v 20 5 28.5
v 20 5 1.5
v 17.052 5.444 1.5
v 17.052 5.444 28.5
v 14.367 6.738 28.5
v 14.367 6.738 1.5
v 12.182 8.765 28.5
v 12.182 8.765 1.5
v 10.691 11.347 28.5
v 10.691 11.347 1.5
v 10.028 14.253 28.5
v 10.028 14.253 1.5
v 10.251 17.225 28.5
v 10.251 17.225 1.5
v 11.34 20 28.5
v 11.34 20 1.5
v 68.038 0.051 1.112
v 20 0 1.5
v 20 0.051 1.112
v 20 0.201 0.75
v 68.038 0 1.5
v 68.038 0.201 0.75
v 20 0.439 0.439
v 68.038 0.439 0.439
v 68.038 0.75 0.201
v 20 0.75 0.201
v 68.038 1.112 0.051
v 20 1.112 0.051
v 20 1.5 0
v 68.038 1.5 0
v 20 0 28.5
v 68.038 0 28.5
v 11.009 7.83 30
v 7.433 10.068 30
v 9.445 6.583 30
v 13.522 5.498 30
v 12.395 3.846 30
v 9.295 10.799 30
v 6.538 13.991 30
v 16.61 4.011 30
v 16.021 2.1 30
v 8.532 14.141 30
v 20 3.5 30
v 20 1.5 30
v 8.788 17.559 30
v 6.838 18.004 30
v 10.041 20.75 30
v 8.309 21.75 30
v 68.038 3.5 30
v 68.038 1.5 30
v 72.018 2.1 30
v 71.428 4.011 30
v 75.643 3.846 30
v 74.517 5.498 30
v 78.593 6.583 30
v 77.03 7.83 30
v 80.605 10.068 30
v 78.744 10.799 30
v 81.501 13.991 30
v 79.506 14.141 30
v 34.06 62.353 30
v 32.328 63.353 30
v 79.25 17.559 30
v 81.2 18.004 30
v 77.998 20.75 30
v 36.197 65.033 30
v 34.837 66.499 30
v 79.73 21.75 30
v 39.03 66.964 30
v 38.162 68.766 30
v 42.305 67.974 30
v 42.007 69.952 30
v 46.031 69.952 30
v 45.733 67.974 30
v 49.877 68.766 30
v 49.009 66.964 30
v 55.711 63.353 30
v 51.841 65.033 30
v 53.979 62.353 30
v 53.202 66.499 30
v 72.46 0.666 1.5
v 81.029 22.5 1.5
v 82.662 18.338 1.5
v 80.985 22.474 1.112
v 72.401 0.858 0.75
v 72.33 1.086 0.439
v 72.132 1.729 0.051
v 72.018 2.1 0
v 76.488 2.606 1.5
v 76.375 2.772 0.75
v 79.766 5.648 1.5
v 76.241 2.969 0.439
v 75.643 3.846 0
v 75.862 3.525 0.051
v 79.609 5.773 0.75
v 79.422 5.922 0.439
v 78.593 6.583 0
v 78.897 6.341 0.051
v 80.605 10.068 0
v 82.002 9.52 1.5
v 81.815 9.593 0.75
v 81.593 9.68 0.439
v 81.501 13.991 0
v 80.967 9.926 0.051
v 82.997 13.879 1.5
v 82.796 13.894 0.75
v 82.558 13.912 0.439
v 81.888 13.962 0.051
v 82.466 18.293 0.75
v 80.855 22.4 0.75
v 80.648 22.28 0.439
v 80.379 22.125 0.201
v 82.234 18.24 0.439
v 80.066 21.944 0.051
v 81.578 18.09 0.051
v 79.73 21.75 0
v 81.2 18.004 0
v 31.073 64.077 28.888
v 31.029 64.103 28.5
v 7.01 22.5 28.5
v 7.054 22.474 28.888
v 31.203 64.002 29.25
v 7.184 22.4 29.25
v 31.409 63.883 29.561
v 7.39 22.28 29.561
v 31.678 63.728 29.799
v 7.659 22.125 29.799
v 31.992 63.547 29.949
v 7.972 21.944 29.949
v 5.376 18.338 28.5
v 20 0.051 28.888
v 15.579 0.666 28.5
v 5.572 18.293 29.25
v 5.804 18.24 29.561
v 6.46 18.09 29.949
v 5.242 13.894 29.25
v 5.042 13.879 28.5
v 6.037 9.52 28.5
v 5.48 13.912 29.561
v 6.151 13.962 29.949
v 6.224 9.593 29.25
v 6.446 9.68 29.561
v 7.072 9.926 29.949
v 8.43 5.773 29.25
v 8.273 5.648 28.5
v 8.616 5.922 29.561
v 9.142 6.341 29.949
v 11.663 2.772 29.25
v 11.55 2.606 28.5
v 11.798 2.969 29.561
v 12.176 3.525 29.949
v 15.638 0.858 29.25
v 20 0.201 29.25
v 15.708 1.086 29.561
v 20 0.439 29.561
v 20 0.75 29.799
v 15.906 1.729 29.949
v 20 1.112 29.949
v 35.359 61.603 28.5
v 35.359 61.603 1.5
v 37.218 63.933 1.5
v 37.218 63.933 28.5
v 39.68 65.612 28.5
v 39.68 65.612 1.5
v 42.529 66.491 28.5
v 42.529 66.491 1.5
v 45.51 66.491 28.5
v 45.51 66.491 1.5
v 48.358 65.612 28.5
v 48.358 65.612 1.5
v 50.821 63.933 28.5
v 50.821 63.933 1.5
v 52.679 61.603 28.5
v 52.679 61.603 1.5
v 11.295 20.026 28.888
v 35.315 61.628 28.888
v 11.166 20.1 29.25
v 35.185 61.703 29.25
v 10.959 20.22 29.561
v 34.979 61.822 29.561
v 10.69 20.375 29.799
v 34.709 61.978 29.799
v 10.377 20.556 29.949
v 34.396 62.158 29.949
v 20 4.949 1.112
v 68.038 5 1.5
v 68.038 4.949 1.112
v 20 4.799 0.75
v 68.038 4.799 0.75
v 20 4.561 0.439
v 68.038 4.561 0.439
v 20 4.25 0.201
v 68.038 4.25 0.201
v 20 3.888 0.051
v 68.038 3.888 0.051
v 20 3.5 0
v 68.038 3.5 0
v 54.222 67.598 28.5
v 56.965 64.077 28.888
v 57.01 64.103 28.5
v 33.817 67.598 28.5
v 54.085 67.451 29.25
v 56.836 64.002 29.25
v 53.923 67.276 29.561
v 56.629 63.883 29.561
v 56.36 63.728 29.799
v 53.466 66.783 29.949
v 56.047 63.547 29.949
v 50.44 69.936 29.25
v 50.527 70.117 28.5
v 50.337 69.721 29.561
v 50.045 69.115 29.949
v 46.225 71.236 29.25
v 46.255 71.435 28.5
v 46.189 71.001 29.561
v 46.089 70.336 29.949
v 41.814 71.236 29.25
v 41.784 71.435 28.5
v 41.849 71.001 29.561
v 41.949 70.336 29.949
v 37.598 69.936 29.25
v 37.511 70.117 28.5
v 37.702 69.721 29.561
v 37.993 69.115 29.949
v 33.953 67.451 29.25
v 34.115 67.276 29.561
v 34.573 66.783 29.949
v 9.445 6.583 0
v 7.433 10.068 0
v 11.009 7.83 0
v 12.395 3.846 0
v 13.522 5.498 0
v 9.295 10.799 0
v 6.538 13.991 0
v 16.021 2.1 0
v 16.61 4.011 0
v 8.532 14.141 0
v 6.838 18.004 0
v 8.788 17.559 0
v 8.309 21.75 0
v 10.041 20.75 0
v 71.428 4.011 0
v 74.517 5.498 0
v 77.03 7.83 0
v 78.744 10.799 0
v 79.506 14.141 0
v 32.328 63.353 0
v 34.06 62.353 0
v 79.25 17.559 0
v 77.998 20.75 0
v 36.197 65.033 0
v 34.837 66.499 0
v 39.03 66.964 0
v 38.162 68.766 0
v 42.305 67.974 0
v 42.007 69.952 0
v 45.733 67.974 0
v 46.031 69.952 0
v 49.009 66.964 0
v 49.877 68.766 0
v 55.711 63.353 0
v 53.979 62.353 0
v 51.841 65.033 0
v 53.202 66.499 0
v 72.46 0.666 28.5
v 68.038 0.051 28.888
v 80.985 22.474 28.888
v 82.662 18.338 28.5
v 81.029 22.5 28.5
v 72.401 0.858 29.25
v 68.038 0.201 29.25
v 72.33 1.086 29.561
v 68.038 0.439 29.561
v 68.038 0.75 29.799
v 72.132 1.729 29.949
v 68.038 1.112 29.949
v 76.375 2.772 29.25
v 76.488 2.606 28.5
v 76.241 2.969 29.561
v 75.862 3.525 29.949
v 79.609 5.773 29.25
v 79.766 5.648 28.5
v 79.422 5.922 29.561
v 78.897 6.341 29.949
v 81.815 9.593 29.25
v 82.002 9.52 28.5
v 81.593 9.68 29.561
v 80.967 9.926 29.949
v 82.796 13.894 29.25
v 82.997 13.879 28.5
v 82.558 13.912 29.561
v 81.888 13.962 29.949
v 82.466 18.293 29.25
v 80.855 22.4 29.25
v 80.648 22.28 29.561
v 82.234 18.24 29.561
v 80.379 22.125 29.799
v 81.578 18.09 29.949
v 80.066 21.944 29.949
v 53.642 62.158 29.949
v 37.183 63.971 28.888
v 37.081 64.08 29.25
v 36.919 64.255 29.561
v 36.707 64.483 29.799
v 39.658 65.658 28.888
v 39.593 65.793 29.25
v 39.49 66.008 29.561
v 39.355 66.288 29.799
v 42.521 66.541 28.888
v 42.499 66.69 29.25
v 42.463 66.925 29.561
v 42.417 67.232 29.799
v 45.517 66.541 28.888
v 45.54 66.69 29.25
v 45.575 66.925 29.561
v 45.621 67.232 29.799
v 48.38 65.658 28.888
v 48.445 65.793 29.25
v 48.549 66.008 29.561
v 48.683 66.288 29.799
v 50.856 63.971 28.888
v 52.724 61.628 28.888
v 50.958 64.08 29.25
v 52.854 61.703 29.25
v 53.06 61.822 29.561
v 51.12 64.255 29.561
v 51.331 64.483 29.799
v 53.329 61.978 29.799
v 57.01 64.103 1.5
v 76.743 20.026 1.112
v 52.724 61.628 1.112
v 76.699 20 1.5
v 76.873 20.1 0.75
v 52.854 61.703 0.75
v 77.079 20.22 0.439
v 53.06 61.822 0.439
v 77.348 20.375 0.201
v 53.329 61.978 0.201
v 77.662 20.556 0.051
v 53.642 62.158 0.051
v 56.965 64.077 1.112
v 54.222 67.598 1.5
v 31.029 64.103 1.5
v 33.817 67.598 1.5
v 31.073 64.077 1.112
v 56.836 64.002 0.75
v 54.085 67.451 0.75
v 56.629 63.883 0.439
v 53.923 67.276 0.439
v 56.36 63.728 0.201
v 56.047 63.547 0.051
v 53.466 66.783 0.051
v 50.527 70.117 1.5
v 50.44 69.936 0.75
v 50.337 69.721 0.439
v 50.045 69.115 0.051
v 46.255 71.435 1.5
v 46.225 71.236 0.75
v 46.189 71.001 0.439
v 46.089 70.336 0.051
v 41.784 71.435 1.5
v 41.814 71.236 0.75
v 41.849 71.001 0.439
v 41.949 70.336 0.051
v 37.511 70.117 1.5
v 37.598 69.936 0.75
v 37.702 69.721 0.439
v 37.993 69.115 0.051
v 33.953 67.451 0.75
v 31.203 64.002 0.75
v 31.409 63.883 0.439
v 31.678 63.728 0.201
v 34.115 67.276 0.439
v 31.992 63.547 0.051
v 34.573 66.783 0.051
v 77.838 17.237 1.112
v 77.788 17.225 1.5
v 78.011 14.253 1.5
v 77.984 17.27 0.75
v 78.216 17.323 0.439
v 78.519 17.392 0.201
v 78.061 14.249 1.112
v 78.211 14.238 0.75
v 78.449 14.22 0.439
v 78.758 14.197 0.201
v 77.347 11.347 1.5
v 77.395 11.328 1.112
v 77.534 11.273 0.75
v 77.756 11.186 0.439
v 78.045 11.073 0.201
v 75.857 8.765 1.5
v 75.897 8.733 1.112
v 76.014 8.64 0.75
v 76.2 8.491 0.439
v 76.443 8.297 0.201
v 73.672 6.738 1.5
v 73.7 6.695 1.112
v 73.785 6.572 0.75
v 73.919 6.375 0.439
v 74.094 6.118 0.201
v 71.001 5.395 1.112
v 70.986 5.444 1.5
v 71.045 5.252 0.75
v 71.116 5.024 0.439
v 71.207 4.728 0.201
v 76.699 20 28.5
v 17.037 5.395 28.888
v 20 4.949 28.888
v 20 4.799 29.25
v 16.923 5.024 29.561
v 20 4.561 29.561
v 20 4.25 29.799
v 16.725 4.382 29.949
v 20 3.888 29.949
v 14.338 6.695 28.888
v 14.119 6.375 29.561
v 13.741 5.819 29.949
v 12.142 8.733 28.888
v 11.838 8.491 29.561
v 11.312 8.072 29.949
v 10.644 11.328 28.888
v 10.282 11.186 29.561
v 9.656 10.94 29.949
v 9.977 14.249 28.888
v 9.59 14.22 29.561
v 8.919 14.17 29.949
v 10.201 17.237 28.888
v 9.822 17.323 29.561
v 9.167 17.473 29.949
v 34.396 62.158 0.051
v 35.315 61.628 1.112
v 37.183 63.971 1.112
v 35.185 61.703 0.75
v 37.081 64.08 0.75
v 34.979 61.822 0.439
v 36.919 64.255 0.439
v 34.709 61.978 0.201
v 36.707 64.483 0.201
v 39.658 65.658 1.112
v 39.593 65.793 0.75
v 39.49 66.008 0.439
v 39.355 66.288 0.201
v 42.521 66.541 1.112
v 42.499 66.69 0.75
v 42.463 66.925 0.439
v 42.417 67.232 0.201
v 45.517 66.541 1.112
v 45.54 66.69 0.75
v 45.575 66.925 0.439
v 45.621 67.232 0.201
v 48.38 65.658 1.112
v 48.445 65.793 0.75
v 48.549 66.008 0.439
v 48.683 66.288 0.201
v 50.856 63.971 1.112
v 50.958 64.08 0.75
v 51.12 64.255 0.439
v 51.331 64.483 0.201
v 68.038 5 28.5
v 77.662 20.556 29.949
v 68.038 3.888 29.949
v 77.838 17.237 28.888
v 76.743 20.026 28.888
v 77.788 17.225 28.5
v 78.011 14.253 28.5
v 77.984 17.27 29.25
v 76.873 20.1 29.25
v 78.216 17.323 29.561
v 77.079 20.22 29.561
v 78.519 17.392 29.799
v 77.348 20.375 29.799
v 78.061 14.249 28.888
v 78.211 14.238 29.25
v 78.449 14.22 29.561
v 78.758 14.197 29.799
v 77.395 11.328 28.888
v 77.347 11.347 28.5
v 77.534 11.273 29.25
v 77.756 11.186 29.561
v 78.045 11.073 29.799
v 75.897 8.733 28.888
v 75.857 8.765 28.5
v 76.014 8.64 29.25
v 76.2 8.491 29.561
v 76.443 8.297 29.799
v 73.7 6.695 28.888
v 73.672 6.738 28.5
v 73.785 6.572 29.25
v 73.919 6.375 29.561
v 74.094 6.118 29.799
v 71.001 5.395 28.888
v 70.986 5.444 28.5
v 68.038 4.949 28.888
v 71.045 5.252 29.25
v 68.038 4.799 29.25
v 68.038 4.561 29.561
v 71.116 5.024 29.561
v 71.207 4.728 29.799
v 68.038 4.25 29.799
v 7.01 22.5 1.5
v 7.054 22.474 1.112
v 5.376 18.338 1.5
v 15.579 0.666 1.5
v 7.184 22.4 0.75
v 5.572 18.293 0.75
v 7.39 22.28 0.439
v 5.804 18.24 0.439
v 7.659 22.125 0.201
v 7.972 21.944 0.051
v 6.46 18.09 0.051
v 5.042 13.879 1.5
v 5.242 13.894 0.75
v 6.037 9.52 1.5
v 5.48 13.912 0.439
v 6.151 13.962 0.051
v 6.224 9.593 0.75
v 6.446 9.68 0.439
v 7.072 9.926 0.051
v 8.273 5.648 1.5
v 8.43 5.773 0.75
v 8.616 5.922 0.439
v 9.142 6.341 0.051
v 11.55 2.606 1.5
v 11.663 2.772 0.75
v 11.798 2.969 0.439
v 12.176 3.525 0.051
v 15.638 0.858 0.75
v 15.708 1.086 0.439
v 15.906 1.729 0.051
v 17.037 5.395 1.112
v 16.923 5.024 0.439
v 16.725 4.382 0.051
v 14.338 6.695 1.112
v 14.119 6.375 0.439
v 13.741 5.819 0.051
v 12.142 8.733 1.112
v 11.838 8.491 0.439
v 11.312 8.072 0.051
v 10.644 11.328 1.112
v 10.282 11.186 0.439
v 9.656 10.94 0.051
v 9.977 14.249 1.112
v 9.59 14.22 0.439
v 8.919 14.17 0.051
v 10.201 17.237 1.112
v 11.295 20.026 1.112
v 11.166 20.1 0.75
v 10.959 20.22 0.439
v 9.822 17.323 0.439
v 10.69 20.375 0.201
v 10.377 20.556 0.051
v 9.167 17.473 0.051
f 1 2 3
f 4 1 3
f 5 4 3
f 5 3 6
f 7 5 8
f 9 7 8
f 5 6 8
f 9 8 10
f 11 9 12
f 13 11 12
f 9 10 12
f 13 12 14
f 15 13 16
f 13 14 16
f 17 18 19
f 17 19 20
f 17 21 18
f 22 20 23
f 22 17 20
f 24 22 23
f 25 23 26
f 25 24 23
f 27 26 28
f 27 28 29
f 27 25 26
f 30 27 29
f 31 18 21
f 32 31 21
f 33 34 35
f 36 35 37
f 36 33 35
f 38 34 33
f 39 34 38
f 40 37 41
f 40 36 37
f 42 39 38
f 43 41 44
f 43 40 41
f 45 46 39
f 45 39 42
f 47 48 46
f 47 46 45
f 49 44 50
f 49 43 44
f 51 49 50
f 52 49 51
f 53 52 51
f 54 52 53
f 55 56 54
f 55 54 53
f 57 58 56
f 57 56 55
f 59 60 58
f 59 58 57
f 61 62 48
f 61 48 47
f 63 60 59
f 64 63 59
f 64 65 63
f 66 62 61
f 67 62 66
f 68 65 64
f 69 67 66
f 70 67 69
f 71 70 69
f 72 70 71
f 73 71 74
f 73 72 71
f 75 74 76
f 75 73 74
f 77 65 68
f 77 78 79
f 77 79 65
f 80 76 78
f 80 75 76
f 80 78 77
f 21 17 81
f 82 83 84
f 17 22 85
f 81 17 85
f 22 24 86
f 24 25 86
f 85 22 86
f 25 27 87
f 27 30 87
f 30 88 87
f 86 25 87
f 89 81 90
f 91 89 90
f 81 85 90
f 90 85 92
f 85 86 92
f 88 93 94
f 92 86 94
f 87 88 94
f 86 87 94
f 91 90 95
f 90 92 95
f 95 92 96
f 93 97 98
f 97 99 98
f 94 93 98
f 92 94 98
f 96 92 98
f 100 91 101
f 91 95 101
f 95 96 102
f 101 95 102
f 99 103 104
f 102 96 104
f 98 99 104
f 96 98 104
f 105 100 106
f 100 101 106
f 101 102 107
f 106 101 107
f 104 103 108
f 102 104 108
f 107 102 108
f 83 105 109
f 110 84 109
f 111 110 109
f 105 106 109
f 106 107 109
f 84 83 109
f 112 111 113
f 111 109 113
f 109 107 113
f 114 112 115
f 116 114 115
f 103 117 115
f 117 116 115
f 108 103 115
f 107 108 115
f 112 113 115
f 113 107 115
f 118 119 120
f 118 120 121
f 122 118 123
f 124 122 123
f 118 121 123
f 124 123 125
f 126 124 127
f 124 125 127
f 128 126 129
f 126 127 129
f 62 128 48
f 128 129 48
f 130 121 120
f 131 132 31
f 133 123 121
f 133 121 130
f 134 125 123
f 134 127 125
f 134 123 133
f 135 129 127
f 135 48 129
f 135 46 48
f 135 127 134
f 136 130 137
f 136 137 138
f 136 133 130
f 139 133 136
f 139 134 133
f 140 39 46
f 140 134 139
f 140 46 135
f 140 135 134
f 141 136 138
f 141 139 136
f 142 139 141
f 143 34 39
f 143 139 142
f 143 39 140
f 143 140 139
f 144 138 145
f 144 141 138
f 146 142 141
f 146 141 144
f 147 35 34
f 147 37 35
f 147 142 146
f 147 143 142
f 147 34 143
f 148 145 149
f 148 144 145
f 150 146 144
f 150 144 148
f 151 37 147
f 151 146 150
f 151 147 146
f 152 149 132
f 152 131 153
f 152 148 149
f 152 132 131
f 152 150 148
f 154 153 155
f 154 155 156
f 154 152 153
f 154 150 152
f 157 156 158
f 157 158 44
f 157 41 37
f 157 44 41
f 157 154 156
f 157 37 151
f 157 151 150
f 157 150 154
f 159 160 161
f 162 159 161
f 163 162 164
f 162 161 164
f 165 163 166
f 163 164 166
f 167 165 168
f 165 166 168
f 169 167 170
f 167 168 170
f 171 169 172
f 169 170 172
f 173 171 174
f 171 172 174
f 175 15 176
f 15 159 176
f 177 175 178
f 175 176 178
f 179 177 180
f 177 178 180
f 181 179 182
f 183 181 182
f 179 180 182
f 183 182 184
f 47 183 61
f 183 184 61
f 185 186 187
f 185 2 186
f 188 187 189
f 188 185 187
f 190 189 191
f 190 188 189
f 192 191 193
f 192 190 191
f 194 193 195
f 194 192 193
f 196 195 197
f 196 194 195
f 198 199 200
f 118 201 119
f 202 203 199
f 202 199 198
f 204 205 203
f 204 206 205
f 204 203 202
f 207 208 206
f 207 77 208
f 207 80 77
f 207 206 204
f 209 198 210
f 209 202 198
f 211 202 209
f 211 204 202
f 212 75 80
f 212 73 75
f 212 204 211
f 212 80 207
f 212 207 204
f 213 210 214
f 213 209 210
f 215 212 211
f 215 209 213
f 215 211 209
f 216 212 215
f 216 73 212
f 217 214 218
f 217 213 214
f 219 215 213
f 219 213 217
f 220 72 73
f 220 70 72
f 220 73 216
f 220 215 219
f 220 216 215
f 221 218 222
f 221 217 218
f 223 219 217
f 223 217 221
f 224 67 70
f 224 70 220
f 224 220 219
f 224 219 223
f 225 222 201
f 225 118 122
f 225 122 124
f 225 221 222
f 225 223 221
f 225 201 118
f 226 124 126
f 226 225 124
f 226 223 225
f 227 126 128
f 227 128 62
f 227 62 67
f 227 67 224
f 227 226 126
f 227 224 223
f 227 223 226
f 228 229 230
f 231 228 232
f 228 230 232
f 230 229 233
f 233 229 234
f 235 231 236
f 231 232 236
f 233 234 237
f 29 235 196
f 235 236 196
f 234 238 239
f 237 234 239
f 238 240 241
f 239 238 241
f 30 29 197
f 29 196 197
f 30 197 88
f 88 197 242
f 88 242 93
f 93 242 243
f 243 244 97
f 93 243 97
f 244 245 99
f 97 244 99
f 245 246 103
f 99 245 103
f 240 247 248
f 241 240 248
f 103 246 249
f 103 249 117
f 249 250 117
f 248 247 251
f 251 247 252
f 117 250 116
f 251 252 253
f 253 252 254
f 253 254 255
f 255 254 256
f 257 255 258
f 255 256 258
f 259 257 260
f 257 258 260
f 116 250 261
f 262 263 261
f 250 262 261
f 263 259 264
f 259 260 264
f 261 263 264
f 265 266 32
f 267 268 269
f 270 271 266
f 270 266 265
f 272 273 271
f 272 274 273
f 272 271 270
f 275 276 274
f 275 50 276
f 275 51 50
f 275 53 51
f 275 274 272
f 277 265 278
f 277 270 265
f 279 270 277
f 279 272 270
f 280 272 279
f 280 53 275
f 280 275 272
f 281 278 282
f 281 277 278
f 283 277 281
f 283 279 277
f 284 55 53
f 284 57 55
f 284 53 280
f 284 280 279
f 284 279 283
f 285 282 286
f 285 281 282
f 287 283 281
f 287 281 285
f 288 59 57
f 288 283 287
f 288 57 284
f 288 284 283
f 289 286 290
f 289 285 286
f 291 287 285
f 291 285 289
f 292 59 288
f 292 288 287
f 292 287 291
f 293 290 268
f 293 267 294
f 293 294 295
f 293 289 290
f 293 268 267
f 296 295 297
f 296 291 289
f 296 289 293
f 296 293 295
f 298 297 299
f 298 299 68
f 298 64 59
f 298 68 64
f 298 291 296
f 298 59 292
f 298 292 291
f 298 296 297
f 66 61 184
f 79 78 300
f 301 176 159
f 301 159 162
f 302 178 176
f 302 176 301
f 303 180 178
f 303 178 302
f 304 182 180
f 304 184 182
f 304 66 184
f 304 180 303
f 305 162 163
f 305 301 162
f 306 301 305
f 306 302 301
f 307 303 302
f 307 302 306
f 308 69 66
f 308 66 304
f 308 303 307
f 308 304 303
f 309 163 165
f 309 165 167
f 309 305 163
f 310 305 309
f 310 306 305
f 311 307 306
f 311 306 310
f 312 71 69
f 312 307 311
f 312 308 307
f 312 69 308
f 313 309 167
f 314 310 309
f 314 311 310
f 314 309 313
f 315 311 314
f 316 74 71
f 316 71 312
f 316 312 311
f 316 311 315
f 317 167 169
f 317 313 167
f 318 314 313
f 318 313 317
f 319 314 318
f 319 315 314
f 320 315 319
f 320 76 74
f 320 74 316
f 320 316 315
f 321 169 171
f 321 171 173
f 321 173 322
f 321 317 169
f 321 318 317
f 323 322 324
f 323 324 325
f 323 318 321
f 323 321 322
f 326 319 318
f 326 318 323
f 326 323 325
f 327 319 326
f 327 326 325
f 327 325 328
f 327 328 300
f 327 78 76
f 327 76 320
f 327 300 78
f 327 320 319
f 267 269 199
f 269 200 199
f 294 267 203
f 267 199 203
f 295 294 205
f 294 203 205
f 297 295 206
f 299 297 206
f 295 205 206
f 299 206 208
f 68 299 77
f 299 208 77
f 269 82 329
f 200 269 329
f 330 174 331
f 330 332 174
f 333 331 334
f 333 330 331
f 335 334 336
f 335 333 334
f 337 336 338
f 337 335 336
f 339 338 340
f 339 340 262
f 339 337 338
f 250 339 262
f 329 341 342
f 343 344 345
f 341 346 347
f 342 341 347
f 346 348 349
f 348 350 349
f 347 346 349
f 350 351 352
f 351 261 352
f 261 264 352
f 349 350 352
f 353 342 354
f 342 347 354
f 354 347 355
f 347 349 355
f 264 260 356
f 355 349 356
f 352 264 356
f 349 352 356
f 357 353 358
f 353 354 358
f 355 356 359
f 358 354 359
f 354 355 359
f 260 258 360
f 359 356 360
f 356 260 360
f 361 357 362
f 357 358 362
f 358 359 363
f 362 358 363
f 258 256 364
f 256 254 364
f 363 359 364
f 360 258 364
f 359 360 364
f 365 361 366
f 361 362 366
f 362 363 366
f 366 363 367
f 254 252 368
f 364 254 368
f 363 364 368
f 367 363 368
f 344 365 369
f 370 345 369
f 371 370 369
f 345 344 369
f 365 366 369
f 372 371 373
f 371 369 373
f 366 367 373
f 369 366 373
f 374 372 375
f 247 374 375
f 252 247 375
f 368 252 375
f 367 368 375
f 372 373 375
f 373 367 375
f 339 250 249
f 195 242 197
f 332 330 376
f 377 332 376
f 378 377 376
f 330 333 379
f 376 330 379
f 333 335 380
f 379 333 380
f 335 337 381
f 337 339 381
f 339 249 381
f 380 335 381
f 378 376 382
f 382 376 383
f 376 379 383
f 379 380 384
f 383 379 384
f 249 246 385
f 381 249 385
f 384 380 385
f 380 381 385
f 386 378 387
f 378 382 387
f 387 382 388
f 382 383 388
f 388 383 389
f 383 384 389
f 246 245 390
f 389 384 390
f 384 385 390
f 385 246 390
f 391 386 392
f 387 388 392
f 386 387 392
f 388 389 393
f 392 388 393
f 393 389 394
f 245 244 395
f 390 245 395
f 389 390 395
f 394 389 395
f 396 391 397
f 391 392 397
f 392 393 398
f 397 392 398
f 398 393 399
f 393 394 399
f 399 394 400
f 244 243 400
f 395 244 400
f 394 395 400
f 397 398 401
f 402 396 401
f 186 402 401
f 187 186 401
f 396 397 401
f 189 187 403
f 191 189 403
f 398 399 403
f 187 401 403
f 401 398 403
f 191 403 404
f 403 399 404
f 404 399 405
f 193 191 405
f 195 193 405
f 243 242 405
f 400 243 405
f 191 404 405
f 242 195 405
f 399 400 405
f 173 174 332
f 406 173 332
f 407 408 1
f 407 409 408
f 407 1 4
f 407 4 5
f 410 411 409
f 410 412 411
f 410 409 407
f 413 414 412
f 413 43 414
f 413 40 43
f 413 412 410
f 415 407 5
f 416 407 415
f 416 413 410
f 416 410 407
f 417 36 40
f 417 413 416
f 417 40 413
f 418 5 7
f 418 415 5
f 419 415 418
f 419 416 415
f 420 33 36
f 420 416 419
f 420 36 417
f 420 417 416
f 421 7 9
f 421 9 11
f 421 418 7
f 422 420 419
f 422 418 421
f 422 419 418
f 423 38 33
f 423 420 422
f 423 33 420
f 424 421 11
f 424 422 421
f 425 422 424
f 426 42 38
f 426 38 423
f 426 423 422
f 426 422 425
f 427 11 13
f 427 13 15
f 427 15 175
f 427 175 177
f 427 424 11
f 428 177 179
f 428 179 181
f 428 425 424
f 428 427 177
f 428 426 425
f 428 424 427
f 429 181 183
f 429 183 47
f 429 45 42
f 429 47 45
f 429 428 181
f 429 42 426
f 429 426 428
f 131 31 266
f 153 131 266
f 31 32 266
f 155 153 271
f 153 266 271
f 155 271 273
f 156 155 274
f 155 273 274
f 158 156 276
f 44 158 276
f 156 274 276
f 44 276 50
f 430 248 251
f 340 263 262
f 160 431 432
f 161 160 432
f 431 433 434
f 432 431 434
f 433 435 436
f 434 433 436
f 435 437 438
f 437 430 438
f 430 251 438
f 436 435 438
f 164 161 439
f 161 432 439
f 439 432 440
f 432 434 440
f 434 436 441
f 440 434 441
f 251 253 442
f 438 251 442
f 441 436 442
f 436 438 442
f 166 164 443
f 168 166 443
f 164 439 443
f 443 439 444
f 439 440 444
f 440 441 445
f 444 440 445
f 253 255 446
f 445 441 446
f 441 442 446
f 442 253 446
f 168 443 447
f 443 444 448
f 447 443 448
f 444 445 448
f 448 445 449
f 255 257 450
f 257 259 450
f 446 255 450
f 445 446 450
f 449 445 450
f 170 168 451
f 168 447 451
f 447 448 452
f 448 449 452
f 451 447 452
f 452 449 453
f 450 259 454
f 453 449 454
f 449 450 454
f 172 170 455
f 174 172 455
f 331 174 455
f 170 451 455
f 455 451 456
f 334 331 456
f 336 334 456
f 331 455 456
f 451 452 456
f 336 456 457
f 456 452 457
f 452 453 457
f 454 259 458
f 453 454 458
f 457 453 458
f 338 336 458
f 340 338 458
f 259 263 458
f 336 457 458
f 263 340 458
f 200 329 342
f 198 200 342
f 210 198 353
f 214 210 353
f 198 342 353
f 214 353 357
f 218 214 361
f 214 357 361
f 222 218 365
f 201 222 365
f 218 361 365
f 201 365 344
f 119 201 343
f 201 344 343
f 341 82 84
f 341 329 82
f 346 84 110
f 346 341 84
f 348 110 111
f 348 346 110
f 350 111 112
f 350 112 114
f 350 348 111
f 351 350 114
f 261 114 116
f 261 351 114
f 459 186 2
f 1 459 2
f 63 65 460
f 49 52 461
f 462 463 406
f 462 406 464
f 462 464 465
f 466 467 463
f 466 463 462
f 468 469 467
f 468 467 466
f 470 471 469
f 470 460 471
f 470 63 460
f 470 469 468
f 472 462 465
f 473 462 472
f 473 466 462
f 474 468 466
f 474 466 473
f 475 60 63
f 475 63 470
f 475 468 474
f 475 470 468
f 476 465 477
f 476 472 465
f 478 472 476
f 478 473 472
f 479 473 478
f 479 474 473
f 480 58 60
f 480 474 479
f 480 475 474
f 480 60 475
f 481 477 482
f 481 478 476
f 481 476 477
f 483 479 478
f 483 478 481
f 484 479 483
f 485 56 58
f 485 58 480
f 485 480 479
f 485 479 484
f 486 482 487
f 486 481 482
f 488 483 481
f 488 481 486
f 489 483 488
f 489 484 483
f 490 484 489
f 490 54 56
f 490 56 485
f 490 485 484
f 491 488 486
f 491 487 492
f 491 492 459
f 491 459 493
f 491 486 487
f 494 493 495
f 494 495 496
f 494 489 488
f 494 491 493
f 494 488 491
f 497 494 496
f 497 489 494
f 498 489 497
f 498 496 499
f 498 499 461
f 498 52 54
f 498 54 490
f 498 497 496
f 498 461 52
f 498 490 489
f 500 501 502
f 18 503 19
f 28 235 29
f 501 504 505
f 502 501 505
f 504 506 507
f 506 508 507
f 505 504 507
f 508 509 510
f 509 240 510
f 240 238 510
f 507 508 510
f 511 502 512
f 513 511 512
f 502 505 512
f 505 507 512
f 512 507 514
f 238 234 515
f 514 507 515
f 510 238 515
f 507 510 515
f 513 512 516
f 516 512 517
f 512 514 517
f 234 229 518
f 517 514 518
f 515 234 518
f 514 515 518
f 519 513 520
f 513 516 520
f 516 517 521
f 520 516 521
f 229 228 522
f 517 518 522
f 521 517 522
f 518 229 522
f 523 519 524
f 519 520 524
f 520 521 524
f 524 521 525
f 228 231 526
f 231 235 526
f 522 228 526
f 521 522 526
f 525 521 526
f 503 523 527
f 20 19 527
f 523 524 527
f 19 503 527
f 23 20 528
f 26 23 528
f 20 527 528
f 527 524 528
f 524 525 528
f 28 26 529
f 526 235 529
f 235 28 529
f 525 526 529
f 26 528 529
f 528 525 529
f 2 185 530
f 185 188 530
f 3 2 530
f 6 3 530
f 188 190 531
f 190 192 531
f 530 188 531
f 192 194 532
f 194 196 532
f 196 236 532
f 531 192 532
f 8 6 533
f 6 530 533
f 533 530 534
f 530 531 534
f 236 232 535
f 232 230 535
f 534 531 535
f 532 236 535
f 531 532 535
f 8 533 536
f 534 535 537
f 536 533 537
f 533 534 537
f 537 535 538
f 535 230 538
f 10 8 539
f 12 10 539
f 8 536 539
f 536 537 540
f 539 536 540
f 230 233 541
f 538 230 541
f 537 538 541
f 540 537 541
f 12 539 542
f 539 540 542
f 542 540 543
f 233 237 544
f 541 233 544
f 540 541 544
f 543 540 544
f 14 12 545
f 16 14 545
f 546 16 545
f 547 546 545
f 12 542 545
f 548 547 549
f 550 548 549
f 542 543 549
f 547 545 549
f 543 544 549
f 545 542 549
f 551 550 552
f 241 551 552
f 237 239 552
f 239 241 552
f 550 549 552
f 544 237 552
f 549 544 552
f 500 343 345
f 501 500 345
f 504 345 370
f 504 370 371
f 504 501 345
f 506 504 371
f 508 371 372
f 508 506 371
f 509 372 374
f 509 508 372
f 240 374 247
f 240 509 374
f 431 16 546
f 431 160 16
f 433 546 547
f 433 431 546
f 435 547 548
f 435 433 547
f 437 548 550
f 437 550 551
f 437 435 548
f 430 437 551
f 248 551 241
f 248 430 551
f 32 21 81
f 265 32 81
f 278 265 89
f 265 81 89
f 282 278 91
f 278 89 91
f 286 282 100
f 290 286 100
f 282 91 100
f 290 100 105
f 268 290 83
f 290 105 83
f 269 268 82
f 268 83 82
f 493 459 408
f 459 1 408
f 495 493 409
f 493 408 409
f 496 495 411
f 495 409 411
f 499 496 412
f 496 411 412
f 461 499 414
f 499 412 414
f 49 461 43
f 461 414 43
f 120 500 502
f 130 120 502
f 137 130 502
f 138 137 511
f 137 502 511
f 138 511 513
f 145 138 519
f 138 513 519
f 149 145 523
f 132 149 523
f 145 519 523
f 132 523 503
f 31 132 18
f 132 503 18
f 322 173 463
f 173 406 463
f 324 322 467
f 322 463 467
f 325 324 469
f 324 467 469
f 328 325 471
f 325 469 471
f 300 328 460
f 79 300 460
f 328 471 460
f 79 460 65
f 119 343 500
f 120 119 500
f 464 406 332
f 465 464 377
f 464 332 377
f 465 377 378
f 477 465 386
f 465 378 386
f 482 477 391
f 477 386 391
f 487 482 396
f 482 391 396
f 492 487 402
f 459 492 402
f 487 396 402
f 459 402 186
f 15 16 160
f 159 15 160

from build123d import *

# Parameters (mm, degrees)
F1_DEPTH = 30
F2_R     = 1.5


with BuildPart() as f1:
    # F0 (on Top) → F1 (new body)
    with BuildSketch(Plane.XY):
        with BuildLine():
            ThreePointArc((7.009619, 22.5), (7.009619, 7.5), (20, 0))
            Line((20, 0), (68.038476, 0))
            ThreePointArc((68.038476, 0), (81.028857, 7.5), (81.028857, 22.5))
            Line((81.028857, 22.5), (57.009619, 64.10254))
            ThreePointArc((57.009619, 64.10254), (44.019238, 71.60254), (31.028857, 64.10254))
            Line((31.028857, 64.10254), (7.009619, 22.5))
        make_face()
        with BuildLine():
            Line((11.339746, 20), (35.358984, 61.60254))
            ThreePointArc((35.358984, 61.60254), (44.019238, 66.60254), (52.679492, 61.60254))
            Line((52.679492, 61.60254), (76.69873, 20))
            ThreePointArc((76.69873, 20), (76.69873, 10), (68.038476, 5))
            Line((68.038476, 5), (20, 5))
            ThreePointArc((20, 5), (11.339746, 10), (11.339746, 20))
        make_face(mode=Mode.SUBTRACT)
    extrude(amount=F1_DEPTH)

    # F2
    f2_edges = [f1.edges().sort_by_distance(p)[0] for p in [
        (31.028857, 64.10254, 15),
        (7.009619, 22.5, 15),
        (19.019238, 43.30127, 0),
        (19.019238, 43.30127, 30),
        (11.339746, 20, 15),
        (35.358984, 61.60254, 15),
        (23.349365, 40.80127, 0),
        (23.349365, 40.80127, 30),
    ]]
    fillet(f2_edges, radius=F2_R)


solid = f1.part
